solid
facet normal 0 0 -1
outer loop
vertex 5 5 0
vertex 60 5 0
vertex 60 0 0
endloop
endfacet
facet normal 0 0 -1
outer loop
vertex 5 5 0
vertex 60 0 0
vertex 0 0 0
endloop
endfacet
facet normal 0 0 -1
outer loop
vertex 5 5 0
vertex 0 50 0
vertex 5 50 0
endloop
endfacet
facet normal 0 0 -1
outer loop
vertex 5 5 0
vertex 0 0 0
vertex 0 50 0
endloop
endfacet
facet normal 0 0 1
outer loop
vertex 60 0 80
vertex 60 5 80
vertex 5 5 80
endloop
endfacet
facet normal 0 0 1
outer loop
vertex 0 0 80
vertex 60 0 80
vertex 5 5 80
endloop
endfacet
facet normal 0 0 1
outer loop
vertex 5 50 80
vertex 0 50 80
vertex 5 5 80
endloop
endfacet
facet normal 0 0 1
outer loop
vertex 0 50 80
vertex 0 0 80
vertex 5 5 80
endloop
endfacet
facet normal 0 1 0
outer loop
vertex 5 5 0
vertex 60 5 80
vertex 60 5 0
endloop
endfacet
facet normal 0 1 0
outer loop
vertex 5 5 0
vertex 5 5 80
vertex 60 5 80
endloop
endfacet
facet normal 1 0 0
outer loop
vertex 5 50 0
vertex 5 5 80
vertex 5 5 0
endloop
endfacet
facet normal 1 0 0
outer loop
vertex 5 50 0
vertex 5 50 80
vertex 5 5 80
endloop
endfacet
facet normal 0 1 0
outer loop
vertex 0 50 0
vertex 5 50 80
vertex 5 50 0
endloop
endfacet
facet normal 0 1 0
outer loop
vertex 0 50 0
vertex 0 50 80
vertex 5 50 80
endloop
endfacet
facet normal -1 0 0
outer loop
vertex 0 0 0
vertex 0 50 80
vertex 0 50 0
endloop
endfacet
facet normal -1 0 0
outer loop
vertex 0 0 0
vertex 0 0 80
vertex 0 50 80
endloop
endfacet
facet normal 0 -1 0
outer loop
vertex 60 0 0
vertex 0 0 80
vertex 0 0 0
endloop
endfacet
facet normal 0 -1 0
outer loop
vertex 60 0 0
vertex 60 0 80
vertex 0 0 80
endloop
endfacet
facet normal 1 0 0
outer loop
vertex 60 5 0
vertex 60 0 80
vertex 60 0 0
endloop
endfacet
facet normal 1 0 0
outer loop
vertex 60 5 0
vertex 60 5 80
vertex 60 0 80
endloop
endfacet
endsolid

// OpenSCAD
$fn = 32;

// ----------------------------------------------------------------------
// Structural section: angle 60 x 50 mm
// ----------------------------------------------------------------------

// --- parameters (mm) ---
sec_w = 60;               // leg width, X
sec_h = 50;               // leg height, Y
flange_t = 5;             // leg thickness
plate_t = 80;             // cut length, Z (extrusion height)

profile = [[0, 0], [60, 0], [60, 5], [5, 5], [5, 50], [0, 50]];  // primary outline, 6 points, counter clockwise

// --- the one profile operation ---
linear_extrude(height = plate_t) polygon(points = profile);
